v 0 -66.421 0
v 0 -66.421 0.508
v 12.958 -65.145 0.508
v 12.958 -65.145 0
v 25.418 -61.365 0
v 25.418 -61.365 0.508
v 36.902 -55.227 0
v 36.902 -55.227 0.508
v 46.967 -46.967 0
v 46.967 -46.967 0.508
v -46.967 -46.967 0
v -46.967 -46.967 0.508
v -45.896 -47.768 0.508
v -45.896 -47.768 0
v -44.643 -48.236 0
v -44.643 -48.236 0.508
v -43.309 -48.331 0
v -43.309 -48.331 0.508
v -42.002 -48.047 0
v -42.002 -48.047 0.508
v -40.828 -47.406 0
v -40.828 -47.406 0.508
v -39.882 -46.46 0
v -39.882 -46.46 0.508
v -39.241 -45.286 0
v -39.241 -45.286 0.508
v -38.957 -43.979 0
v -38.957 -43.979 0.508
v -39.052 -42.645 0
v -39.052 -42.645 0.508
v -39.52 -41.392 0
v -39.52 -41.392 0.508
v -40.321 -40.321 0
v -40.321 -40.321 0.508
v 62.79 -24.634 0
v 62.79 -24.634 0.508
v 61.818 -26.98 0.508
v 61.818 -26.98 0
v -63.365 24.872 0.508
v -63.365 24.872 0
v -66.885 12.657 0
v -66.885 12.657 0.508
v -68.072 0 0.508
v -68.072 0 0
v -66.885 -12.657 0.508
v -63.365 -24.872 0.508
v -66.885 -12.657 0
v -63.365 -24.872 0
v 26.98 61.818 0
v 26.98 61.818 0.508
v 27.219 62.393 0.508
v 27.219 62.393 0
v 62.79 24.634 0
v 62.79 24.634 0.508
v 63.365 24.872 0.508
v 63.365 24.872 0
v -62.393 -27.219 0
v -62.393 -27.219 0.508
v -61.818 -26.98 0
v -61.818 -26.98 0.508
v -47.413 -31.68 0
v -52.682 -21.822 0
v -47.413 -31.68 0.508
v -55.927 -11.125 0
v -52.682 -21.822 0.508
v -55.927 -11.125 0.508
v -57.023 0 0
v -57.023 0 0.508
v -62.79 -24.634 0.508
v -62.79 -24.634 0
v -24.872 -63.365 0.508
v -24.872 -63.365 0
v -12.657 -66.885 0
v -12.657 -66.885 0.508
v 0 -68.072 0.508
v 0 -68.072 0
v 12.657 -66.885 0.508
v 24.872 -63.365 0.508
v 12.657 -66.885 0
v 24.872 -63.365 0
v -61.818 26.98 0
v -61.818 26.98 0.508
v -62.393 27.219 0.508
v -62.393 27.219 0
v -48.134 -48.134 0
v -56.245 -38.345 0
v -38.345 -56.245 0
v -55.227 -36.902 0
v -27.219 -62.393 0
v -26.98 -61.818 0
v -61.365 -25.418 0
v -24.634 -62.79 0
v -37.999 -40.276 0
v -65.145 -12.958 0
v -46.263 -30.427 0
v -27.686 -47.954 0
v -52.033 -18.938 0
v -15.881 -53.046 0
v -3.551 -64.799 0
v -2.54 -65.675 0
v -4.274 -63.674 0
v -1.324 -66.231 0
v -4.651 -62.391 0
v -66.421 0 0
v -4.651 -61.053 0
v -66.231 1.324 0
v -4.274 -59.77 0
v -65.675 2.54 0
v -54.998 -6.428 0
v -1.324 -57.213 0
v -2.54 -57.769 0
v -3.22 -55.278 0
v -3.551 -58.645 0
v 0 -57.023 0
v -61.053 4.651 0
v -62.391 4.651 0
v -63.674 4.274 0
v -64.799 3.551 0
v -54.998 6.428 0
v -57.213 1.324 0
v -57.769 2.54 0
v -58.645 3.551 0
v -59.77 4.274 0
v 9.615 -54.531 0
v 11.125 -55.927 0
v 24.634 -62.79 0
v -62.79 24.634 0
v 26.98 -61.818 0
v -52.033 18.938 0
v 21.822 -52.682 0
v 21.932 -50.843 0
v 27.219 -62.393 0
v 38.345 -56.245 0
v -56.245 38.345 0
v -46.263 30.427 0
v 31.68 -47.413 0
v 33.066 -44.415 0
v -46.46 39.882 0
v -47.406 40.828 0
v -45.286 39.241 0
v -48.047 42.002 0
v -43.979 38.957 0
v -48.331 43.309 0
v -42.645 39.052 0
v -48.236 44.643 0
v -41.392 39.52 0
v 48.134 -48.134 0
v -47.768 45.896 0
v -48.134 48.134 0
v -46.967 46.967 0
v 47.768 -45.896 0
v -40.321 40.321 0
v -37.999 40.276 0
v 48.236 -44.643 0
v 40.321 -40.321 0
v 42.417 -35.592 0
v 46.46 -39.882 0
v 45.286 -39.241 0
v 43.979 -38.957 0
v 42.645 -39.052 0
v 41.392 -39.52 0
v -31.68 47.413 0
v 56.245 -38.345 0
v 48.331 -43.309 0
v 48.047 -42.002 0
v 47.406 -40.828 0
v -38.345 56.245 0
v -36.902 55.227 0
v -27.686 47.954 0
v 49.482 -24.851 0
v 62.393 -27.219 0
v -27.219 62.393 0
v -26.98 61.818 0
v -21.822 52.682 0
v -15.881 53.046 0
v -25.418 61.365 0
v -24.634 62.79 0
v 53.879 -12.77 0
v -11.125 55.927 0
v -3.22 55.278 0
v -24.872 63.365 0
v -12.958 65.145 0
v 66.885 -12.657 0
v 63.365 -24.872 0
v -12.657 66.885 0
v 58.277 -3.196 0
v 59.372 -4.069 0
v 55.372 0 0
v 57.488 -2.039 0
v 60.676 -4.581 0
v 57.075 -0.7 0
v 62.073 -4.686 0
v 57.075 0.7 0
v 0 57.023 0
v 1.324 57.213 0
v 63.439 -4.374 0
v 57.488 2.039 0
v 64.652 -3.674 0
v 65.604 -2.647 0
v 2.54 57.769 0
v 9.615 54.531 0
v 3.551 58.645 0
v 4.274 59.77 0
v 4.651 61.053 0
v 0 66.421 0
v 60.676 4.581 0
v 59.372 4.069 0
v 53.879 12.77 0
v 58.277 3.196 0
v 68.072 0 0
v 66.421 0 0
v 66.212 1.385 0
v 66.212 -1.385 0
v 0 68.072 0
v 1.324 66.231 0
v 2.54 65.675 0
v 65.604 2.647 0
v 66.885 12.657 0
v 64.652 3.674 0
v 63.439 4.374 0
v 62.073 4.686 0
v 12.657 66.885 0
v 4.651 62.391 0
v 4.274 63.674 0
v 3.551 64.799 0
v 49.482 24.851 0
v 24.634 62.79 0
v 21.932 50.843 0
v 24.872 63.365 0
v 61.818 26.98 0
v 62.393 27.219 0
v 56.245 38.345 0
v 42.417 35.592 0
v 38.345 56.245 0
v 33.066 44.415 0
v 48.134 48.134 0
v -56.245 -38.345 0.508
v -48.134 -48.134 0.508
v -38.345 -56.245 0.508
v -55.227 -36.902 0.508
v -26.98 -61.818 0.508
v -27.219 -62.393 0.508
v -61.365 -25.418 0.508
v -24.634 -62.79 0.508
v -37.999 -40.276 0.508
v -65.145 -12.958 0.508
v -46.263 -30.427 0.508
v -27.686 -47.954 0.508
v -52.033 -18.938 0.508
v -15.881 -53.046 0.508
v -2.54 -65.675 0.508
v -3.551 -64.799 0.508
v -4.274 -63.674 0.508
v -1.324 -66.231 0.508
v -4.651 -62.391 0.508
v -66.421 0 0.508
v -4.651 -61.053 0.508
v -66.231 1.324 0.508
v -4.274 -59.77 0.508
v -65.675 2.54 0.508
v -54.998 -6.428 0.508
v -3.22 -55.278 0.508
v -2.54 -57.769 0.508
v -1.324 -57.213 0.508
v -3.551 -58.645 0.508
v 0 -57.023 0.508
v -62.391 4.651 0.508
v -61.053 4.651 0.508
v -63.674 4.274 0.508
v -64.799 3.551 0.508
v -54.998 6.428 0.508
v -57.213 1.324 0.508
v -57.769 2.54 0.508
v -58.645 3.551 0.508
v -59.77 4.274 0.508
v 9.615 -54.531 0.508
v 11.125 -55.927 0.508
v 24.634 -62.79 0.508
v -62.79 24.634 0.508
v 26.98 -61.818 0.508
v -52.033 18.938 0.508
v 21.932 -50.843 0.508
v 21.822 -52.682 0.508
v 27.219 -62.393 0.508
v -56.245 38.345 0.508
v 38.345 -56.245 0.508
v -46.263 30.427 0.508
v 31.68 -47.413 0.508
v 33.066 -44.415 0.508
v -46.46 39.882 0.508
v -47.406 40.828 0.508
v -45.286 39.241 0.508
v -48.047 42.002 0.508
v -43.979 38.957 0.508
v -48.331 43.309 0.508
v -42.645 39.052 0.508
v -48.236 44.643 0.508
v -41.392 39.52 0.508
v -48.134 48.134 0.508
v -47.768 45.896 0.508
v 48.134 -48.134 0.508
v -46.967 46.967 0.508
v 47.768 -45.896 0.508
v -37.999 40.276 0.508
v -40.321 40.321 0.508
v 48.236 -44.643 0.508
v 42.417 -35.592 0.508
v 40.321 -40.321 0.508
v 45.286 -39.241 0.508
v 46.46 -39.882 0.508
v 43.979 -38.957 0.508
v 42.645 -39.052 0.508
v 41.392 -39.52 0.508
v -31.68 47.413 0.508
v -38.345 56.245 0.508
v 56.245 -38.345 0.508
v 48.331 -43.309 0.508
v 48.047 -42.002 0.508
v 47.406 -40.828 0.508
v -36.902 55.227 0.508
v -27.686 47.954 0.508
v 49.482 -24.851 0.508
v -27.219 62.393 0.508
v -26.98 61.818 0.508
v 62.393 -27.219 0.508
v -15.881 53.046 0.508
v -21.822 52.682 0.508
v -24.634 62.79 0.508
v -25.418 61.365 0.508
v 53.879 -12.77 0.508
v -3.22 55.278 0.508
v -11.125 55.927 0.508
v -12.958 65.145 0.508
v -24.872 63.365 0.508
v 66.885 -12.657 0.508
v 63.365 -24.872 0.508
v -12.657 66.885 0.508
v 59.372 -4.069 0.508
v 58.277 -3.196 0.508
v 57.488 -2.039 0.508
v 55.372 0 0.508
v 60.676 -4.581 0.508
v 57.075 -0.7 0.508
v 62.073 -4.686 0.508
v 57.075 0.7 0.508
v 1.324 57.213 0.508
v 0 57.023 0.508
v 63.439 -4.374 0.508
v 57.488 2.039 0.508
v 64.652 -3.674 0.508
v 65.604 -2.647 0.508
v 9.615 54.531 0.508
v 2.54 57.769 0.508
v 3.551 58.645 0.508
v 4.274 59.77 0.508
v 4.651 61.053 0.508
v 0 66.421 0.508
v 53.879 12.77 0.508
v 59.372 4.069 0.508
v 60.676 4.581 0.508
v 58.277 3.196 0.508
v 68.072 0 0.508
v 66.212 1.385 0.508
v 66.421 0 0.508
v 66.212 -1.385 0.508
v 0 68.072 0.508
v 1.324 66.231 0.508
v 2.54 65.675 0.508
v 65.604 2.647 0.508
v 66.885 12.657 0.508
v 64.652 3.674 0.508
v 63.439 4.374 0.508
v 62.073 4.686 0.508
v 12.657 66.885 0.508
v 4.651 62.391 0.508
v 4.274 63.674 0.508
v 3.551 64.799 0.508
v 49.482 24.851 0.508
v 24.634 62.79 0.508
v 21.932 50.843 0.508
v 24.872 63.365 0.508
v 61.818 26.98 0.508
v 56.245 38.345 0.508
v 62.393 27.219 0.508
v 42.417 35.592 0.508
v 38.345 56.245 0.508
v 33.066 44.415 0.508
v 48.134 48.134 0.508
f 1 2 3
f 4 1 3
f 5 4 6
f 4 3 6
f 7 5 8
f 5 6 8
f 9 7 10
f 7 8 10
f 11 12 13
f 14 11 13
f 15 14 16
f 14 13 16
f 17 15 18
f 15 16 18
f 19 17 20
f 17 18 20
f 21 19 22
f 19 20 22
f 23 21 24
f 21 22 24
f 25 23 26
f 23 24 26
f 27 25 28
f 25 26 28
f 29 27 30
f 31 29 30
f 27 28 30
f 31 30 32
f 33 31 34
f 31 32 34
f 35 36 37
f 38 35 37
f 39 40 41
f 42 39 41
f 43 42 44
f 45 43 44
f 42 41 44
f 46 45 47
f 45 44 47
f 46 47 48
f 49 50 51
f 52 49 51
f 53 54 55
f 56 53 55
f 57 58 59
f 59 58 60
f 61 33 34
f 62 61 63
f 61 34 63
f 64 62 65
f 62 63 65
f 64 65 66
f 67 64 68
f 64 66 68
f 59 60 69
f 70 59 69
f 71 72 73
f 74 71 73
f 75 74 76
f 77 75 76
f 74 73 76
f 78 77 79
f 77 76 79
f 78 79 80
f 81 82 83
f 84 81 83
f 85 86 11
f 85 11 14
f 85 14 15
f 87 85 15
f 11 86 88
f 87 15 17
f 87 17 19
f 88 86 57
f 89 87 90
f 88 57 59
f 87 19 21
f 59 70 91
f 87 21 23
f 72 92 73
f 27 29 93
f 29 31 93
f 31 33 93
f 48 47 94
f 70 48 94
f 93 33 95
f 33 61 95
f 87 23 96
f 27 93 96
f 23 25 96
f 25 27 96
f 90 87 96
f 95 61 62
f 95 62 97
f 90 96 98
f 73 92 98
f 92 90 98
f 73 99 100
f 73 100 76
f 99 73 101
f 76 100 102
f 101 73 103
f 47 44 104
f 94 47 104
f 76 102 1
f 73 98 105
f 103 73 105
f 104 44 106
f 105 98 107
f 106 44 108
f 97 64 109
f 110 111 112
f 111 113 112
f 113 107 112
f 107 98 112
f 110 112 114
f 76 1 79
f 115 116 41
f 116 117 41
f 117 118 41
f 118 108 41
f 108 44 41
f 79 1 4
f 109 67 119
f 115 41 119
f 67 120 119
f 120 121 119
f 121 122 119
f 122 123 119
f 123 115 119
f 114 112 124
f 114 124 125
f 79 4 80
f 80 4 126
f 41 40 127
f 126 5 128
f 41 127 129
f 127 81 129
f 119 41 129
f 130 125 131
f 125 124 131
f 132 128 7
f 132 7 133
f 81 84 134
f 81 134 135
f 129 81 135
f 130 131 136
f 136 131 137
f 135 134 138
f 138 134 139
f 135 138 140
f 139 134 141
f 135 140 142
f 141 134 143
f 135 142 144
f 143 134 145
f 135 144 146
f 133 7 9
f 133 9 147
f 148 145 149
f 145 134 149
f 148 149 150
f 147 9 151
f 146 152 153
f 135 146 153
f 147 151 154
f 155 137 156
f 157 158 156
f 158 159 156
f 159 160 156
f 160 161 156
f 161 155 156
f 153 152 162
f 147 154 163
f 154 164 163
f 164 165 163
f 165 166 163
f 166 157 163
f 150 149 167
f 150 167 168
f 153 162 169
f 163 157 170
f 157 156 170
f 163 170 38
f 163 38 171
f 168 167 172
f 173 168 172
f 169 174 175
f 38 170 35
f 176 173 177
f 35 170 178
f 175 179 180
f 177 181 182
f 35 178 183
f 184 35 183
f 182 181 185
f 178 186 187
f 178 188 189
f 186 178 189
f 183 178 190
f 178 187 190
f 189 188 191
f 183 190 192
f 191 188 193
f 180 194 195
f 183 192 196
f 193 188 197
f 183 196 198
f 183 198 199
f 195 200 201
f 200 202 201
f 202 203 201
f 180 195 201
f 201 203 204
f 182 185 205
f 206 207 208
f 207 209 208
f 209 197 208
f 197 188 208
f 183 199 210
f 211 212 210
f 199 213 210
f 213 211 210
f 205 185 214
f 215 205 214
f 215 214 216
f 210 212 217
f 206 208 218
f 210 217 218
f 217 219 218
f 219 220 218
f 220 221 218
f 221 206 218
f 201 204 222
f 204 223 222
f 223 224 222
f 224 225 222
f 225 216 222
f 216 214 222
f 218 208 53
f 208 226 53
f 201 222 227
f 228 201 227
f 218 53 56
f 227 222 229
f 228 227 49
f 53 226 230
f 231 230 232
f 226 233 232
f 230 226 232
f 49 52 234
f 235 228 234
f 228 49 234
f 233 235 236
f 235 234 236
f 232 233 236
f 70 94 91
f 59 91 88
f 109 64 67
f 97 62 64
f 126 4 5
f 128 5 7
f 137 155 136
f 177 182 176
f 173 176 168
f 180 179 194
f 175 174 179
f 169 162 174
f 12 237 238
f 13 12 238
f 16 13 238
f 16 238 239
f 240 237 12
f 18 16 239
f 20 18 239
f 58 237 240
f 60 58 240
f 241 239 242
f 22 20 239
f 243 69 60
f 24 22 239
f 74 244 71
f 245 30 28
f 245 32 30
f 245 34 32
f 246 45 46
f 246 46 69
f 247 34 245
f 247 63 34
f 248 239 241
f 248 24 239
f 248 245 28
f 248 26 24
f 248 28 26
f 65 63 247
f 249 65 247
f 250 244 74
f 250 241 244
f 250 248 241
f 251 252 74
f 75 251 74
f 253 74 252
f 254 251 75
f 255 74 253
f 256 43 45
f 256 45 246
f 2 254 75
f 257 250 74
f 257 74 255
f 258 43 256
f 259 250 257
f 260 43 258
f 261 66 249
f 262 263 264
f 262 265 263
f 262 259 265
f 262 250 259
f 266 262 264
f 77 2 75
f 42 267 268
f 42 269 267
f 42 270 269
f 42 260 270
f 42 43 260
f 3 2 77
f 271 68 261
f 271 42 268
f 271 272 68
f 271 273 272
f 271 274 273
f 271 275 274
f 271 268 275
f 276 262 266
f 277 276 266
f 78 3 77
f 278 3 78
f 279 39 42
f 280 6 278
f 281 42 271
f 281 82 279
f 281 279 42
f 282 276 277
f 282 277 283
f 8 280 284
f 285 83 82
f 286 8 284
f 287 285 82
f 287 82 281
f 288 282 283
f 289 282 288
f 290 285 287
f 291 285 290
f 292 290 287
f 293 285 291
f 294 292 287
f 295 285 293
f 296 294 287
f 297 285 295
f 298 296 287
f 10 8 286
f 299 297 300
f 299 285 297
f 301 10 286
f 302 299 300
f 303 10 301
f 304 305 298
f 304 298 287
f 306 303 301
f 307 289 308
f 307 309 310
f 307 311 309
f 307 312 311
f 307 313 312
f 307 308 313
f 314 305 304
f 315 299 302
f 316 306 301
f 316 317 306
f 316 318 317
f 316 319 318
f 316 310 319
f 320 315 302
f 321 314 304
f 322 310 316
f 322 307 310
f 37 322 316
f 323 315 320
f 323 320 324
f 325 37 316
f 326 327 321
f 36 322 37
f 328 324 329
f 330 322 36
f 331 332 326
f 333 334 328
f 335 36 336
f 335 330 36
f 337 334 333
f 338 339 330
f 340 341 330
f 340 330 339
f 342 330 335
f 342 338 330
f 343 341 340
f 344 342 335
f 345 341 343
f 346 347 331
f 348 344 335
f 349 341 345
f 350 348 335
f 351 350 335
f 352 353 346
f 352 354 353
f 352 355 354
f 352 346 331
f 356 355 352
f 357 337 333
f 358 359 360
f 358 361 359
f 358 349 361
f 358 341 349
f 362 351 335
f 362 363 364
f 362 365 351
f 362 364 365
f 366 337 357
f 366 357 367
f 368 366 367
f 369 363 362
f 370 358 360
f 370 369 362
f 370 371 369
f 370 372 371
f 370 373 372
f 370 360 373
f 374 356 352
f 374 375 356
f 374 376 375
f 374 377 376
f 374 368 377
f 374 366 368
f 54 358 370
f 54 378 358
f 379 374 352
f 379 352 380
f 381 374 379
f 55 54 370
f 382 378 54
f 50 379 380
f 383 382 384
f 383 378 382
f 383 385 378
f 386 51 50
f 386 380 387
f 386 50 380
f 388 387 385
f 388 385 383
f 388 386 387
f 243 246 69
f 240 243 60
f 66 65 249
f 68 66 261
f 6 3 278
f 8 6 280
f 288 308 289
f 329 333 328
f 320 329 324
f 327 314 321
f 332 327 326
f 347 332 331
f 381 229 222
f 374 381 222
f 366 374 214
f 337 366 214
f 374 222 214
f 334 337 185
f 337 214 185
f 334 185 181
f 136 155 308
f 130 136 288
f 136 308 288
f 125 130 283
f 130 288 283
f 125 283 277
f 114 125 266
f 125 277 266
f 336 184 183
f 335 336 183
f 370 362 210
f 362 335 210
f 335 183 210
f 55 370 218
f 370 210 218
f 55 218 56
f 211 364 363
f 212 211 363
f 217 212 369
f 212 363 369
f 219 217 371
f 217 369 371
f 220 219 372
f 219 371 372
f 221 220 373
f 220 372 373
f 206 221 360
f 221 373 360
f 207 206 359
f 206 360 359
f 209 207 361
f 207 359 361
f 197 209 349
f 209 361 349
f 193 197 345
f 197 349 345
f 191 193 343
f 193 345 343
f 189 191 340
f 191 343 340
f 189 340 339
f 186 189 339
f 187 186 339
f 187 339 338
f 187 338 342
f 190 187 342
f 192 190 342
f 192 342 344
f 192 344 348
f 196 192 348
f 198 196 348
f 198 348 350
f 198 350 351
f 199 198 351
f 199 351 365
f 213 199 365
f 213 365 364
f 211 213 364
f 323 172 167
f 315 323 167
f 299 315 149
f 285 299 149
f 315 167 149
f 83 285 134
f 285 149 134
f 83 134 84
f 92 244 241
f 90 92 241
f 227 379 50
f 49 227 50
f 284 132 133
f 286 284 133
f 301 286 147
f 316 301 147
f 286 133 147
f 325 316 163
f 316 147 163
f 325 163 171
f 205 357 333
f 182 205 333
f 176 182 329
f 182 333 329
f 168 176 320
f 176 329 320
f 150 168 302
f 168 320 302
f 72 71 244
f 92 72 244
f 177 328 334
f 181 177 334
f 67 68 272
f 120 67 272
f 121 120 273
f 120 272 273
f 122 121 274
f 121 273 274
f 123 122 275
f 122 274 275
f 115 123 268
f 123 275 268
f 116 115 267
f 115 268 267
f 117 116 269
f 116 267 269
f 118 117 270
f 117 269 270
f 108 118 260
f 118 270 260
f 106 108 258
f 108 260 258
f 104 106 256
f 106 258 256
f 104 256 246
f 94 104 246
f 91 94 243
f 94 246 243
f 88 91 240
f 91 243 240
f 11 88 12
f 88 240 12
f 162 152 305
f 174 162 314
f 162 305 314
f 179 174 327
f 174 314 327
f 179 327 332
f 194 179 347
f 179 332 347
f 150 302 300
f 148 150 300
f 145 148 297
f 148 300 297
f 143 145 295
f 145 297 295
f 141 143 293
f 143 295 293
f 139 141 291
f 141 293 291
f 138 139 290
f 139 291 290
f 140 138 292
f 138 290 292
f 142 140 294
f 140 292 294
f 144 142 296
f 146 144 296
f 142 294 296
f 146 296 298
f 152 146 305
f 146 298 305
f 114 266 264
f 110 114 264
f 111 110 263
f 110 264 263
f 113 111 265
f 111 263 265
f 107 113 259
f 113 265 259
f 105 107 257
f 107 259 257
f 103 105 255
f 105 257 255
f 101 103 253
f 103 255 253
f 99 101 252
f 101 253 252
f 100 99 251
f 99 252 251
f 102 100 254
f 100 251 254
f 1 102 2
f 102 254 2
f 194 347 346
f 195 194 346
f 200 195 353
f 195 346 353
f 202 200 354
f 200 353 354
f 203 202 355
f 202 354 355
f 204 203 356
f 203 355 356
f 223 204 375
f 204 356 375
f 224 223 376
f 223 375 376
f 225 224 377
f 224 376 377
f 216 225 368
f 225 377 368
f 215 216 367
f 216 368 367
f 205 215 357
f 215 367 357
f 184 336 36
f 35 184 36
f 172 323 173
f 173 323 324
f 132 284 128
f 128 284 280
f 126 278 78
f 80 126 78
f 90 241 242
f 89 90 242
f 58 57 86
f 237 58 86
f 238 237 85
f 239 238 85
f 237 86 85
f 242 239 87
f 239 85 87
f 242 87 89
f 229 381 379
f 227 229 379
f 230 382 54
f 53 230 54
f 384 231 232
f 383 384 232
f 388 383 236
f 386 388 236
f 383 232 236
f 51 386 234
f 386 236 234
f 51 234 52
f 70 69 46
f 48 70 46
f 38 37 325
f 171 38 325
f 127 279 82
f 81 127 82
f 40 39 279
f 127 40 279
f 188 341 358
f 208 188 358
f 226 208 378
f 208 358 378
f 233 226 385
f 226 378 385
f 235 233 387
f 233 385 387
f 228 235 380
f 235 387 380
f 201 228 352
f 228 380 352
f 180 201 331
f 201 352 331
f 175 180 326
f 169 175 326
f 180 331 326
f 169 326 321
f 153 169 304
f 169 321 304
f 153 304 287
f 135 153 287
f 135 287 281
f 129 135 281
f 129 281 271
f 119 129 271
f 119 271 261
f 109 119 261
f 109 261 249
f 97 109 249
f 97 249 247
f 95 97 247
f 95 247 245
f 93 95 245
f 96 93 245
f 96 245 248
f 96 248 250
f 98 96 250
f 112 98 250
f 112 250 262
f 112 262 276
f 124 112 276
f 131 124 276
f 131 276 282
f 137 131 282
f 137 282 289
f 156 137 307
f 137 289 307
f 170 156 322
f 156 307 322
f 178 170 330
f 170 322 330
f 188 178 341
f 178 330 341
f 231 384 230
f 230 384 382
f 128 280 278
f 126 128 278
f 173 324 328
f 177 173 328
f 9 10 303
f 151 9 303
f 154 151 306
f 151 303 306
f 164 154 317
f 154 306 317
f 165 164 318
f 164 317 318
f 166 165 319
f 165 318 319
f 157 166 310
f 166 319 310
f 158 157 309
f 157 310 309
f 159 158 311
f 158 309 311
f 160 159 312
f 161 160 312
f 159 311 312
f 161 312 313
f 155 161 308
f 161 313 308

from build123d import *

# Parameters (mm, degrees)
SKETCH4_R           = 68.072
BOSS_EXTRUDE2_DEPTH = 0.508
SKETCH5_R           = 55.372
CUT_EXTRUDE5_DEPTH  = 1.508
SKETCH6_R           = 4.699
CUT_EXTRUDE6_DEPTH  = 1.508
CUT_EXTRUDE11_DEPTH = 1.508


with BuildPart() as part:
    # Sketch4 → Boss-Extrude2 (new body)
    with BuildSketch(Plane.XY):
        Circle(SKETCH4_R)
    extrude(amount=BOSS_EXTRUDE2_DEPTH)

    # Sketch5 → Cut-Extrude5 (cut, through all)
    with BuildSketch(Plane.XY.offset(0.508)):
        Circle(SKETCH5_R)
    extrude(amount=-CUT_EXTRUDE5_DEPTH, mode=Mode.SUBTRACT)

    # Sketch6 → Cut-Extrude6 (cut, through all)
    with BuildSketch(Plane.XY.offset(0.508)):
        with Locations((61.722, 0)):
            Circle(SKETCH6_R)
        with BuildLine():
            ThreePointArc((46.966739403, -46.966739623), (46.966739521, -40.321349991), (40.321349889, -40.321350078))
            ThreePointArc((40.321349889, -40.321350078), (21.821757973, -52.68238233), (1.451e-06, -57.023))
            ThreePointArc((1.451e-06, -57.023), (-4.699, -61.72200012), (1.691e-06, -66.421))
            ThreePointArc((1.691e-06, -66.421), (25.41821697, -61.365002135), (46.966739403, -46.966739623))
        make_face()
        with BuildLine():
            ThreePointArc((-46.966739623, -46.966739403), (-40.321349991, -46.966739521), (-40.321350078, -40.321349889))
            ThreePointArc((-40.321350078, -40.321349889), (-52.68238233, -21.821757973), (-57.023, -1.451e-06))
            ThreePointArc((-57.023, -1.451e-06), (-61.72200012, 4.699), (-66.421, -1.69e-06))
            ThreePointArc((-66.421, -1.69e-06), (-61.365002135, -25.41821697), (-46.966739623, -46.966739403))
        make_face()
        with BuildLine():
            ThreePointArc((-46.966739403, 46.966739623), (-46.966739521, 40.321349991), (-40.321349889, 40.321350078))
            ThreePointArc((-40.321349889, 40.321350078), (-21.821757973, 52.68238233), (-1.451e-06, 57.023))
            ThreePointArc((-1.451e-06, 57.023), (4.699, 61.72200012), (-1.69e-06, 66.421))
            ThreePointArc((-1.69e-06, 66.421), (-25.41821697, 61.365002135), (-46.966739403, 46.966739623))
        make_face()
    extrude(amount=-CUT_EXTRUDE6_DEPTH, mode=Mode.SUBTRACT)

    # Sketch8 → Cut-Extrude11 (cut, through all)
    with BuildSketch(Plane.XY.offset(0.508)):
        Polygon((63.962998999, 25.119703581), (62.990983081, 27.466357594), (61.817656075, 26.980349635), (62.789671993, 24.633695622), align=None)
        Polygon((-25.119703581, 63.962998999), (-27.466357594, 62.990983081), (-26.980349635, 61.817656075), (-24.633695622, 62.789671993), align=None)
        Polygon((-62.990983081, 27.466357594), (-63.962998999, 25.119703581), (-62.789671993, 24.633695622), (-61.817656075, 26.980349635), align=None)
        Polygon((-63.962998999, -25.119703581), (-62.990983081, -27.466357594), (-61.817656075, -26.980349635), (-62.789671993, -24.633695622), align=None)
        Polygon((-27.466357594, -62.990983081), (-25.119703581, -63.962998999), (-24.633695622, -62.789671993), (-26.980349635, -61.817656075), align=None)
        Polygon((25.119703581, -63.962998999), (27.466357594, -62.990983081), (26.980349635, -61.817656075), (24.633695622, -62.789671993), align=None)
        Polygon((62.990983081, -27.466357594), (63.962998999, -25.119703581), (62.789671993, -24.633695622), (61.817656075, -26.980349635), align=None)
        Polygon((27.466357594, 62.990983081), (25.119703581, 63.962998999), (24.633695622, 62.789671993), (26.980349635, 61.817656075), align=None)
    extrude(amount=-CUT_EXTRUDE11_DEPTH, mode=Mode.SUBTRACT)


solid = part.part
